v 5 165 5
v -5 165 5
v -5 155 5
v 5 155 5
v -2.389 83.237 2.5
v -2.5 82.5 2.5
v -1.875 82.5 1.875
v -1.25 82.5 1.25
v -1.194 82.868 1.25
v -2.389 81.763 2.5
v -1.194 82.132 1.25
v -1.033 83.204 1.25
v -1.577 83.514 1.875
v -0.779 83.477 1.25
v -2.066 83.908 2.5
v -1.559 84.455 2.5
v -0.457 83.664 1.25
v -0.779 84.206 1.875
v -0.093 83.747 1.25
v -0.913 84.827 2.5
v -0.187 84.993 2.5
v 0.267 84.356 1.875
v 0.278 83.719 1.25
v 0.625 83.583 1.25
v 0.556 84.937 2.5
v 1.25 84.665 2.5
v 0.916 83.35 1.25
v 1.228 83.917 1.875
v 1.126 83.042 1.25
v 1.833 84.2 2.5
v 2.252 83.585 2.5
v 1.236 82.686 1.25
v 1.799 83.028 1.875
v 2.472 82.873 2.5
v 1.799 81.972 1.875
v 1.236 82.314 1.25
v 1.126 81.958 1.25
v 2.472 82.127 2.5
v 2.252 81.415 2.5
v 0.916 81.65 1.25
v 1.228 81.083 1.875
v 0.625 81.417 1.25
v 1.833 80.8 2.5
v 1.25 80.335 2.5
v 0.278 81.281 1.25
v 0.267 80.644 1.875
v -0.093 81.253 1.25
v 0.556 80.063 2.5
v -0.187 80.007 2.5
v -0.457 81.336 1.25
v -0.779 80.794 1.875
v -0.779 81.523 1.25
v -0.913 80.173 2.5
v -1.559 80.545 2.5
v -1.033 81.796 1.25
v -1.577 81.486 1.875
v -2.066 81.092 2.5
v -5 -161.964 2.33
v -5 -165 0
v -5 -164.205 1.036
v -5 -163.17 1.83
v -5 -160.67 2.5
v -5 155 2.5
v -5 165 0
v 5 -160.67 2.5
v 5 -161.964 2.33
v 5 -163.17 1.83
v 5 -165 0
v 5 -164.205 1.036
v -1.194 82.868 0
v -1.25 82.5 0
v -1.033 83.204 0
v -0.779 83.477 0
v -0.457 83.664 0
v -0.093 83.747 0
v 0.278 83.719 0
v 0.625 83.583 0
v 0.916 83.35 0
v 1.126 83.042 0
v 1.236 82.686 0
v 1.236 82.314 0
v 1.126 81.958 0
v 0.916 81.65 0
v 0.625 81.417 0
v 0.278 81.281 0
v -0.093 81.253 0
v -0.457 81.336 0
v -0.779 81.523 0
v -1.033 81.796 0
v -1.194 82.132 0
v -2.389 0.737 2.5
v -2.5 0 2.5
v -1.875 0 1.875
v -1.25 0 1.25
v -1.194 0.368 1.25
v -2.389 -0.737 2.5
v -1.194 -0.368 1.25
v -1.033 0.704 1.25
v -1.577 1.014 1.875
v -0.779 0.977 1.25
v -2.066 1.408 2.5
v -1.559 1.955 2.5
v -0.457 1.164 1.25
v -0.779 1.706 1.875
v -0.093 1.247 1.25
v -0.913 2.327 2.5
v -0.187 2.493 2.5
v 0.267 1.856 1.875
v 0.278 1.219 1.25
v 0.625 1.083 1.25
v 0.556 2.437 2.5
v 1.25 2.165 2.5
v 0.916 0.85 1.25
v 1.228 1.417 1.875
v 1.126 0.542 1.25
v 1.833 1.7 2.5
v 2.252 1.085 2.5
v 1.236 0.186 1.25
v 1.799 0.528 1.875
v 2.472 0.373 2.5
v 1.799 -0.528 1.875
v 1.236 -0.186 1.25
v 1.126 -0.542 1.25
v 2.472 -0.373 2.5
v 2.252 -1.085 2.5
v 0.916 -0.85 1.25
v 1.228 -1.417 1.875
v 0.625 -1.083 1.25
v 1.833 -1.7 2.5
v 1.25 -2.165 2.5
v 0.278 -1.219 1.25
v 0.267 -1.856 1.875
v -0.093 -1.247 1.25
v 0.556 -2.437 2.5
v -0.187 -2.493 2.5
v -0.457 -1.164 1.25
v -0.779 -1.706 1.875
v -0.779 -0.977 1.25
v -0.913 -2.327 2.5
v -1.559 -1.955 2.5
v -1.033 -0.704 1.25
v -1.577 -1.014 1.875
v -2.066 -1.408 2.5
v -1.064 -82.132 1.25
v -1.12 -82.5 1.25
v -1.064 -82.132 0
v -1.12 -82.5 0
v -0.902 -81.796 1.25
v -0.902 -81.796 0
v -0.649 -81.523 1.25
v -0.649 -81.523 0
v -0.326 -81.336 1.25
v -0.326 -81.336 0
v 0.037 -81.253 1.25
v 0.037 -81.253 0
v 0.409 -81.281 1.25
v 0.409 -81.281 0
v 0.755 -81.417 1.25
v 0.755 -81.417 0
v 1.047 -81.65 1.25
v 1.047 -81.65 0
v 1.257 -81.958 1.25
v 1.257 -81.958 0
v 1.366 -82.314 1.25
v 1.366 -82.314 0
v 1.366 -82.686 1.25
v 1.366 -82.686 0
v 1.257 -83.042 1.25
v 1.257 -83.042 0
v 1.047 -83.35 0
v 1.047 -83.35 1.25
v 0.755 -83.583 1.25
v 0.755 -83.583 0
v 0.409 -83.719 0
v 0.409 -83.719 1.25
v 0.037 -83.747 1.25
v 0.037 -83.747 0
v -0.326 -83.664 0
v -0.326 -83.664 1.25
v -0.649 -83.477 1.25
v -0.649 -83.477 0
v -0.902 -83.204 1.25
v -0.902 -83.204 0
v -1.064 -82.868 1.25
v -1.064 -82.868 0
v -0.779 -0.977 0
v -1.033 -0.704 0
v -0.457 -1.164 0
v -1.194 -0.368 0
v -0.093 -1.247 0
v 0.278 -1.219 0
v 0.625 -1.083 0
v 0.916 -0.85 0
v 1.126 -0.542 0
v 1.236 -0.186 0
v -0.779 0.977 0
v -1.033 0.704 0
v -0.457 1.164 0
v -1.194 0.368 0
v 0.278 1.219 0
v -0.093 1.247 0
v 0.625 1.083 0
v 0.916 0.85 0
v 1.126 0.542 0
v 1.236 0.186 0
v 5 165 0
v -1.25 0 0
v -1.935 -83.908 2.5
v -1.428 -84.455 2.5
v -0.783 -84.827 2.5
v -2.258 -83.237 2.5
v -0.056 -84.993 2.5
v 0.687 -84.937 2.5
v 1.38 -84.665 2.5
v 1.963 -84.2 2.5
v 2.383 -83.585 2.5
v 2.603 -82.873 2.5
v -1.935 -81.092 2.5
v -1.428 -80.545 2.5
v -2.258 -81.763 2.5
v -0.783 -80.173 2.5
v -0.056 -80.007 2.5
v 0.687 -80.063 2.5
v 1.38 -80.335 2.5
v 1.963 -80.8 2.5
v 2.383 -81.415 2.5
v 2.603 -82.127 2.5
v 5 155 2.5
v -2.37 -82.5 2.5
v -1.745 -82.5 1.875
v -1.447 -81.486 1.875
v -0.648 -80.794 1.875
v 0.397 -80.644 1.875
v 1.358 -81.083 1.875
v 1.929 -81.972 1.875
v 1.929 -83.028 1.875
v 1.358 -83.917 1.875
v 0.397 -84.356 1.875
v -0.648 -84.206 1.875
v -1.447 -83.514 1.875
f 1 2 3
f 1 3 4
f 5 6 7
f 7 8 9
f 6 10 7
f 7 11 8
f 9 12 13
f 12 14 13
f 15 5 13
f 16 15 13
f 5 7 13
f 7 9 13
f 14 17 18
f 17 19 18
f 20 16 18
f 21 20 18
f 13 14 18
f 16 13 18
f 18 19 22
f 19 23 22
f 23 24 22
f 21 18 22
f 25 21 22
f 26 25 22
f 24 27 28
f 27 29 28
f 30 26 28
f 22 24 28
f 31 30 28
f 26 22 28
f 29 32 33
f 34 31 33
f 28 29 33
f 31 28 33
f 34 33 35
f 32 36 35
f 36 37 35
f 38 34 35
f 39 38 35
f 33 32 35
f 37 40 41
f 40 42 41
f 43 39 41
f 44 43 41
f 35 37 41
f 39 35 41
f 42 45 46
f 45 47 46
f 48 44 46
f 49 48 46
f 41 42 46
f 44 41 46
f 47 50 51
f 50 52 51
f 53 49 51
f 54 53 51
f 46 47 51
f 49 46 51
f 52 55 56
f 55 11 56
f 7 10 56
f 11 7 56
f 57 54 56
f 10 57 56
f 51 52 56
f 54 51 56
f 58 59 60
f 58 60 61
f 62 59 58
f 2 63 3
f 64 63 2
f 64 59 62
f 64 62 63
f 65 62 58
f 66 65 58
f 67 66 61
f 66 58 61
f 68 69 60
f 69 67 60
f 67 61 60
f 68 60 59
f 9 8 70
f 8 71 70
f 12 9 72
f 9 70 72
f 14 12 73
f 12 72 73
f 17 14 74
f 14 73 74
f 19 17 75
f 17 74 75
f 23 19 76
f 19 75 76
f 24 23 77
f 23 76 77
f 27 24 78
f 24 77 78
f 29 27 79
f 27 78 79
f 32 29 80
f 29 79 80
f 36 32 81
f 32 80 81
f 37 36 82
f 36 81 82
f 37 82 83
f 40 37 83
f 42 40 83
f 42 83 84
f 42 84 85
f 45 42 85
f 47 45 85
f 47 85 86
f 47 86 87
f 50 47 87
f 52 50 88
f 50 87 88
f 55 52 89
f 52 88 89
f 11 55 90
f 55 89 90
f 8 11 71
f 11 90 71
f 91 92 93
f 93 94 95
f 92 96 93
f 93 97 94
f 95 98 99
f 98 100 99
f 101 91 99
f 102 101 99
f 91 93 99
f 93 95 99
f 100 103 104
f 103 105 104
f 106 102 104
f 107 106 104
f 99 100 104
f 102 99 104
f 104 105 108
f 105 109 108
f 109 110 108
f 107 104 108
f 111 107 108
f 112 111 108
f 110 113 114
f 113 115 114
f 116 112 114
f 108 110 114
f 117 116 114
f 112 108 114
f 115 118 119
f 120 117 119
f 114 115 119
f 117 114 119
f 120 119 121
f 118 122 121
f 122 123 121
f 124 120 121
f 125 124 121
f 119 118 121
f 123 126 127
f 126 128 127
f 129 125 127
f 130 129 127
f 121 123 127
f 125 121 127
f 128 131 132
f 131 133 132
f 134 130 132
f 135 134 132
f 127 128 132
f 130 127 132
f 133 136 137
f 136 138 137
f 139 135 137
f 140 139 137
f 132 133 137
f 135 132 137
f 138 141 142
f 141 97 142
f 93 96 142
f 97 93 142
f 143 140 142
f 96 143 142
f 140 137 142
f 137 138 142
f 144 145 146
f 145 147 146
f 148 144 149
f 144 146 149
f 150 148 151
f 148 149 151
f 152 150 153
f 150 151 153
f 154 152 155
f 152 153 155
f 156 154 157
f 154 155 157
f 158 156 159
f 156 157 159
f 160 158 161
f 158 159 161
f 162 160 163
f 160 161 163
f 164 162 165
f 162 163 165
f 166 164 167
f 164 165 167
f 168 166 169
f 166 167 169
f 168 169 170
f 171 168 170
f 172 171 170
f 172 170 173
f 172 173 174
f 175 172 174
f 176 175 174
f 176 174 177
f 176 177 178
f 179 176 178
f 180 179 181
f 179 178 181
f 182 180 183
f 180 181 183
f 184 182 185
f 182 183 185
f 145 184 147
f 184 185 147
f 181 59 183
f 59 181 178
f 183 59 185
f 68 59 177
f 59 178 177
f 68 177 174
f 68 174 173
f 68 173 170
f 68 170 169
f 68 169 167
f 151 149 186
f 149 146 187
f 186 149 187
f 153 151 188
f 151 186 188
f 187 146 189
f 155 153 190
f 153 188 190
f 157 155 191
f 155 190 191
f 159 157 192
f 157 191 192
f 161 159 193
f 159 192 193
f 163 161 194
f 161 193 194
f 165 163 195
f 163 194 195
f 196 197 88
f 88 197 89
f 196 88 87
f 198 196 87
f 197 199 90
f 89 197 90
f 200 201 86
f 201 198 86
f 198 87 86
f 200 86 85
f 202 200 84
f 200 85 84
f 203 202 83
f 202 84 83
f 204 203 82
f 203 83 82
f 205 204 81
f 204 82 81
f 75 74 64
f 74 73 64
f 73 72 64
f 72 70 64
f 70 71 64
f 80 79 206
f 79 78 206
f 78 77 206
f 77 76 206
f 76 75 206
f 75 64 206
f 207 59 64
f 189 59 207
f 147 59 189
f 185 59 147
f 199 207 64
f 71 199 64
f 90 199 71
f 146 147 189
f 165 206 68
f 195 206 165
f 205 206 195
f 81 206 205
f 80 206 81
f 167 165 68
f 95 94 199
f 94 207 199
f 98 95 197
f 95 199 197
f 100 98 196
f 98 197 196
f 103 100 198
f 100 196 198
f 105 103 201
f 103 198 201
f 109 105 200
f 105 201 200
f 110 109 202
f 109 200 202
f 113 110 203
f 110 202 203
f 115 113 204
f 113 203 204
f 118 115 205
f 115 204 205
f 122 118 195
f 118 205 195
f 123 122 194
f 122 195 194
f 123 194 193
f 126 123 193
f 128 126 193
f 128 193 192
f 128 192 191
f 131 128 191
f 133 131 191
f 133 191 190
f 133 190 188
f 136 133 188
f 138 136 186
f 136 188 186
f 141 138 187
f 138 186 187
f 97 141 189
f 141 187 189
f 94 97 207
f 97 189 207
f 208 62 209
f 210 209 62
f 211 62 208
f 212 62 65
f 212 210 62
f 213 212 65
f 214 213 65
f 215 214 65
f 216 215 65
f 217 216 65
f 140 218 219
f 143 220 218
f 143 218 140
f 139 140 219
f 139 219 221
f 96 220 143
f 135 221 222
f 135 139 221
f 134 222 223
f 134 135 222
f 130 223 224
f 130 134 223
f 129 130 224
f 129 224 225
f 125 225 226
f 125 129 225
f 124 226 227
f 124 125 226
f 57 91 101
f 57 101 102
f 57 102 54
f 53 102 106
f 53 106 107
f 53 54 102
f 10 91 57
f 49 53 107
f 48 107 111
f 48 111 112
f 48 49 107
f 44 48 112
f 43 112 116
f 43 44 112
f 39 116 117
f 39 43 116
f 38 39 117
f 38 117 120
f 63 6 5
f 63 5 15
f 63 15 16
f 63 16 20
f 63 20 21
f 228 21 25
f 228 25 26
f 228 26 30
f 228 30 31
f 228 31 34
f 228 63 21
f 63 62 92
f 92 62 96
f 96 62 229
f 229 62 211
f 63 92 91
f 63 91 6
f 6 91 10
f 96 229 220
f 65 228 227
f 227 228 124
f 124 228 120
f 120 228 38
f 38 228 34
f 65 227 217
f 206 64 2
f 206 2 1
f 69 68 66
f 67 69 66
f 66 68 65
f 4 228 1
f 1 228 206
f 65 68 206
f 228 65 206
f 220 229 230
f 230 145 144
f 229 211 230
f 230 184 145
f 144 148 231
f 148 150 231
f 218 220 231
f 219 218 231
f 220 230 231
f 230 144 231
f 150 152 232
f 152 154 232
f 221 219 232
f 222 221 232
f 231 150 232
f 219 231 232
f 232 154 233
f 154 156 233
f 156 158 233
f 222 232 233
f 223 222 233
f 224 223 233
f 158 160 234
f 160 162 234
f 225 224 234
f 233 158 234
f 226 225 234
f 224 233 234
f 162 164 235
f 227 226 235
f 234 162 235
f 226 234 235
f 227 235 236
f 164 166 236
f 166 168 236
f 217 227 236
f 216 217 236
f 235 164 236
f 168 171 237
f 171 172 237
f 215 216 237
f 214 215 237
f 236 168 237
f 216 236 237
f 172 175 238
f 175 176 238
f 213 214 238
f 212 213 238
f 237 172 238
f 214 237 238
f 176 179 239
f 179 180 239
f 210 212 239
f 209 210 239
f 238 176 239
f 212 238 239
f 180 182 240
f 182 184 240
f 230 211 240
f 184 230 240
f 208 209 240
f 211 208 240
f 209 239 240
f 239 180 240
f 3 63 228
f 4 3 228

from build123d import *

# Parameters (mm, degrees)
F0_W           = 10
F0_H           = 320
F1_DEPTH       = 2.5
F0_H_2         = 10
F2_DEPTH       = 5
F3_T1_DEPTH    = 31.6506350946
F5_D           = 2.5
F5_DEPTH       = 2.5
F5_CSINK_D     = 5
F5_CSINK_ANGLE = 90
F5_TIP         = 0.7510757738


# Not quite as in the source:
# - a fillet or chamfer that OpenCascade refuses, or shapes differently, is made with other operations: its cross-section is extruded or revolved along the edge and cut away or added


with BuildPart() as f1:
    # F0 (on Top) → F1 (new body)
    with BuildSketch(Plane.XY):
        with Locations((0, -5)):
            Rectangle(F0_W, F0_H)
    extrude(amount=F1_DEPTH)

    # F0 (on Top) → F2 (join)
    with BuildSketch(Plane.XY):
        with Locations((0, 160)):
            Rectangle(F0_W, F0_H_2)
    extrude(amount=F2_DEPTH)

    # F3: fillet of radius 5 on 1 edges, made by hand

    # F3_s2 → F3_t1 (cut)
    with BuildSketch(Plane.YZ.offset(-15.8253175473)):
        with BuildLine():
            ThreePointArc((-160.6698729811, 2.5), (-163.1698729811, 1.8301270189), (-165, 0))
            Line((-165, 0), (-165, 2.5))
            Line((-165, 2.5), (-160.6698729811, 2.5))
        make_face()
    extrude(amount=F3_T1_DEPTH, mode=Mode.SUBTRACT)

    # F5
    with Locations(Plane.XY.offset(2.5)):
        with Locations((0, 82.5), (0, 0), (0.1304344232, -82.5)):
            CounterSinkHole(F5_D / 2, F5_CSINK_D / 2, depth=F5_DEPTH, counter_sink_angle=F5_CSINK_ANGLE)
            with Locations((0, 0, -(F5_DEPTH + F5_TIP / 2))):  # 118° drill point
                Cone(0, F5_D / 2, F5_TIP, mode=Mode.SUBTRACT)


solid = f1.part
